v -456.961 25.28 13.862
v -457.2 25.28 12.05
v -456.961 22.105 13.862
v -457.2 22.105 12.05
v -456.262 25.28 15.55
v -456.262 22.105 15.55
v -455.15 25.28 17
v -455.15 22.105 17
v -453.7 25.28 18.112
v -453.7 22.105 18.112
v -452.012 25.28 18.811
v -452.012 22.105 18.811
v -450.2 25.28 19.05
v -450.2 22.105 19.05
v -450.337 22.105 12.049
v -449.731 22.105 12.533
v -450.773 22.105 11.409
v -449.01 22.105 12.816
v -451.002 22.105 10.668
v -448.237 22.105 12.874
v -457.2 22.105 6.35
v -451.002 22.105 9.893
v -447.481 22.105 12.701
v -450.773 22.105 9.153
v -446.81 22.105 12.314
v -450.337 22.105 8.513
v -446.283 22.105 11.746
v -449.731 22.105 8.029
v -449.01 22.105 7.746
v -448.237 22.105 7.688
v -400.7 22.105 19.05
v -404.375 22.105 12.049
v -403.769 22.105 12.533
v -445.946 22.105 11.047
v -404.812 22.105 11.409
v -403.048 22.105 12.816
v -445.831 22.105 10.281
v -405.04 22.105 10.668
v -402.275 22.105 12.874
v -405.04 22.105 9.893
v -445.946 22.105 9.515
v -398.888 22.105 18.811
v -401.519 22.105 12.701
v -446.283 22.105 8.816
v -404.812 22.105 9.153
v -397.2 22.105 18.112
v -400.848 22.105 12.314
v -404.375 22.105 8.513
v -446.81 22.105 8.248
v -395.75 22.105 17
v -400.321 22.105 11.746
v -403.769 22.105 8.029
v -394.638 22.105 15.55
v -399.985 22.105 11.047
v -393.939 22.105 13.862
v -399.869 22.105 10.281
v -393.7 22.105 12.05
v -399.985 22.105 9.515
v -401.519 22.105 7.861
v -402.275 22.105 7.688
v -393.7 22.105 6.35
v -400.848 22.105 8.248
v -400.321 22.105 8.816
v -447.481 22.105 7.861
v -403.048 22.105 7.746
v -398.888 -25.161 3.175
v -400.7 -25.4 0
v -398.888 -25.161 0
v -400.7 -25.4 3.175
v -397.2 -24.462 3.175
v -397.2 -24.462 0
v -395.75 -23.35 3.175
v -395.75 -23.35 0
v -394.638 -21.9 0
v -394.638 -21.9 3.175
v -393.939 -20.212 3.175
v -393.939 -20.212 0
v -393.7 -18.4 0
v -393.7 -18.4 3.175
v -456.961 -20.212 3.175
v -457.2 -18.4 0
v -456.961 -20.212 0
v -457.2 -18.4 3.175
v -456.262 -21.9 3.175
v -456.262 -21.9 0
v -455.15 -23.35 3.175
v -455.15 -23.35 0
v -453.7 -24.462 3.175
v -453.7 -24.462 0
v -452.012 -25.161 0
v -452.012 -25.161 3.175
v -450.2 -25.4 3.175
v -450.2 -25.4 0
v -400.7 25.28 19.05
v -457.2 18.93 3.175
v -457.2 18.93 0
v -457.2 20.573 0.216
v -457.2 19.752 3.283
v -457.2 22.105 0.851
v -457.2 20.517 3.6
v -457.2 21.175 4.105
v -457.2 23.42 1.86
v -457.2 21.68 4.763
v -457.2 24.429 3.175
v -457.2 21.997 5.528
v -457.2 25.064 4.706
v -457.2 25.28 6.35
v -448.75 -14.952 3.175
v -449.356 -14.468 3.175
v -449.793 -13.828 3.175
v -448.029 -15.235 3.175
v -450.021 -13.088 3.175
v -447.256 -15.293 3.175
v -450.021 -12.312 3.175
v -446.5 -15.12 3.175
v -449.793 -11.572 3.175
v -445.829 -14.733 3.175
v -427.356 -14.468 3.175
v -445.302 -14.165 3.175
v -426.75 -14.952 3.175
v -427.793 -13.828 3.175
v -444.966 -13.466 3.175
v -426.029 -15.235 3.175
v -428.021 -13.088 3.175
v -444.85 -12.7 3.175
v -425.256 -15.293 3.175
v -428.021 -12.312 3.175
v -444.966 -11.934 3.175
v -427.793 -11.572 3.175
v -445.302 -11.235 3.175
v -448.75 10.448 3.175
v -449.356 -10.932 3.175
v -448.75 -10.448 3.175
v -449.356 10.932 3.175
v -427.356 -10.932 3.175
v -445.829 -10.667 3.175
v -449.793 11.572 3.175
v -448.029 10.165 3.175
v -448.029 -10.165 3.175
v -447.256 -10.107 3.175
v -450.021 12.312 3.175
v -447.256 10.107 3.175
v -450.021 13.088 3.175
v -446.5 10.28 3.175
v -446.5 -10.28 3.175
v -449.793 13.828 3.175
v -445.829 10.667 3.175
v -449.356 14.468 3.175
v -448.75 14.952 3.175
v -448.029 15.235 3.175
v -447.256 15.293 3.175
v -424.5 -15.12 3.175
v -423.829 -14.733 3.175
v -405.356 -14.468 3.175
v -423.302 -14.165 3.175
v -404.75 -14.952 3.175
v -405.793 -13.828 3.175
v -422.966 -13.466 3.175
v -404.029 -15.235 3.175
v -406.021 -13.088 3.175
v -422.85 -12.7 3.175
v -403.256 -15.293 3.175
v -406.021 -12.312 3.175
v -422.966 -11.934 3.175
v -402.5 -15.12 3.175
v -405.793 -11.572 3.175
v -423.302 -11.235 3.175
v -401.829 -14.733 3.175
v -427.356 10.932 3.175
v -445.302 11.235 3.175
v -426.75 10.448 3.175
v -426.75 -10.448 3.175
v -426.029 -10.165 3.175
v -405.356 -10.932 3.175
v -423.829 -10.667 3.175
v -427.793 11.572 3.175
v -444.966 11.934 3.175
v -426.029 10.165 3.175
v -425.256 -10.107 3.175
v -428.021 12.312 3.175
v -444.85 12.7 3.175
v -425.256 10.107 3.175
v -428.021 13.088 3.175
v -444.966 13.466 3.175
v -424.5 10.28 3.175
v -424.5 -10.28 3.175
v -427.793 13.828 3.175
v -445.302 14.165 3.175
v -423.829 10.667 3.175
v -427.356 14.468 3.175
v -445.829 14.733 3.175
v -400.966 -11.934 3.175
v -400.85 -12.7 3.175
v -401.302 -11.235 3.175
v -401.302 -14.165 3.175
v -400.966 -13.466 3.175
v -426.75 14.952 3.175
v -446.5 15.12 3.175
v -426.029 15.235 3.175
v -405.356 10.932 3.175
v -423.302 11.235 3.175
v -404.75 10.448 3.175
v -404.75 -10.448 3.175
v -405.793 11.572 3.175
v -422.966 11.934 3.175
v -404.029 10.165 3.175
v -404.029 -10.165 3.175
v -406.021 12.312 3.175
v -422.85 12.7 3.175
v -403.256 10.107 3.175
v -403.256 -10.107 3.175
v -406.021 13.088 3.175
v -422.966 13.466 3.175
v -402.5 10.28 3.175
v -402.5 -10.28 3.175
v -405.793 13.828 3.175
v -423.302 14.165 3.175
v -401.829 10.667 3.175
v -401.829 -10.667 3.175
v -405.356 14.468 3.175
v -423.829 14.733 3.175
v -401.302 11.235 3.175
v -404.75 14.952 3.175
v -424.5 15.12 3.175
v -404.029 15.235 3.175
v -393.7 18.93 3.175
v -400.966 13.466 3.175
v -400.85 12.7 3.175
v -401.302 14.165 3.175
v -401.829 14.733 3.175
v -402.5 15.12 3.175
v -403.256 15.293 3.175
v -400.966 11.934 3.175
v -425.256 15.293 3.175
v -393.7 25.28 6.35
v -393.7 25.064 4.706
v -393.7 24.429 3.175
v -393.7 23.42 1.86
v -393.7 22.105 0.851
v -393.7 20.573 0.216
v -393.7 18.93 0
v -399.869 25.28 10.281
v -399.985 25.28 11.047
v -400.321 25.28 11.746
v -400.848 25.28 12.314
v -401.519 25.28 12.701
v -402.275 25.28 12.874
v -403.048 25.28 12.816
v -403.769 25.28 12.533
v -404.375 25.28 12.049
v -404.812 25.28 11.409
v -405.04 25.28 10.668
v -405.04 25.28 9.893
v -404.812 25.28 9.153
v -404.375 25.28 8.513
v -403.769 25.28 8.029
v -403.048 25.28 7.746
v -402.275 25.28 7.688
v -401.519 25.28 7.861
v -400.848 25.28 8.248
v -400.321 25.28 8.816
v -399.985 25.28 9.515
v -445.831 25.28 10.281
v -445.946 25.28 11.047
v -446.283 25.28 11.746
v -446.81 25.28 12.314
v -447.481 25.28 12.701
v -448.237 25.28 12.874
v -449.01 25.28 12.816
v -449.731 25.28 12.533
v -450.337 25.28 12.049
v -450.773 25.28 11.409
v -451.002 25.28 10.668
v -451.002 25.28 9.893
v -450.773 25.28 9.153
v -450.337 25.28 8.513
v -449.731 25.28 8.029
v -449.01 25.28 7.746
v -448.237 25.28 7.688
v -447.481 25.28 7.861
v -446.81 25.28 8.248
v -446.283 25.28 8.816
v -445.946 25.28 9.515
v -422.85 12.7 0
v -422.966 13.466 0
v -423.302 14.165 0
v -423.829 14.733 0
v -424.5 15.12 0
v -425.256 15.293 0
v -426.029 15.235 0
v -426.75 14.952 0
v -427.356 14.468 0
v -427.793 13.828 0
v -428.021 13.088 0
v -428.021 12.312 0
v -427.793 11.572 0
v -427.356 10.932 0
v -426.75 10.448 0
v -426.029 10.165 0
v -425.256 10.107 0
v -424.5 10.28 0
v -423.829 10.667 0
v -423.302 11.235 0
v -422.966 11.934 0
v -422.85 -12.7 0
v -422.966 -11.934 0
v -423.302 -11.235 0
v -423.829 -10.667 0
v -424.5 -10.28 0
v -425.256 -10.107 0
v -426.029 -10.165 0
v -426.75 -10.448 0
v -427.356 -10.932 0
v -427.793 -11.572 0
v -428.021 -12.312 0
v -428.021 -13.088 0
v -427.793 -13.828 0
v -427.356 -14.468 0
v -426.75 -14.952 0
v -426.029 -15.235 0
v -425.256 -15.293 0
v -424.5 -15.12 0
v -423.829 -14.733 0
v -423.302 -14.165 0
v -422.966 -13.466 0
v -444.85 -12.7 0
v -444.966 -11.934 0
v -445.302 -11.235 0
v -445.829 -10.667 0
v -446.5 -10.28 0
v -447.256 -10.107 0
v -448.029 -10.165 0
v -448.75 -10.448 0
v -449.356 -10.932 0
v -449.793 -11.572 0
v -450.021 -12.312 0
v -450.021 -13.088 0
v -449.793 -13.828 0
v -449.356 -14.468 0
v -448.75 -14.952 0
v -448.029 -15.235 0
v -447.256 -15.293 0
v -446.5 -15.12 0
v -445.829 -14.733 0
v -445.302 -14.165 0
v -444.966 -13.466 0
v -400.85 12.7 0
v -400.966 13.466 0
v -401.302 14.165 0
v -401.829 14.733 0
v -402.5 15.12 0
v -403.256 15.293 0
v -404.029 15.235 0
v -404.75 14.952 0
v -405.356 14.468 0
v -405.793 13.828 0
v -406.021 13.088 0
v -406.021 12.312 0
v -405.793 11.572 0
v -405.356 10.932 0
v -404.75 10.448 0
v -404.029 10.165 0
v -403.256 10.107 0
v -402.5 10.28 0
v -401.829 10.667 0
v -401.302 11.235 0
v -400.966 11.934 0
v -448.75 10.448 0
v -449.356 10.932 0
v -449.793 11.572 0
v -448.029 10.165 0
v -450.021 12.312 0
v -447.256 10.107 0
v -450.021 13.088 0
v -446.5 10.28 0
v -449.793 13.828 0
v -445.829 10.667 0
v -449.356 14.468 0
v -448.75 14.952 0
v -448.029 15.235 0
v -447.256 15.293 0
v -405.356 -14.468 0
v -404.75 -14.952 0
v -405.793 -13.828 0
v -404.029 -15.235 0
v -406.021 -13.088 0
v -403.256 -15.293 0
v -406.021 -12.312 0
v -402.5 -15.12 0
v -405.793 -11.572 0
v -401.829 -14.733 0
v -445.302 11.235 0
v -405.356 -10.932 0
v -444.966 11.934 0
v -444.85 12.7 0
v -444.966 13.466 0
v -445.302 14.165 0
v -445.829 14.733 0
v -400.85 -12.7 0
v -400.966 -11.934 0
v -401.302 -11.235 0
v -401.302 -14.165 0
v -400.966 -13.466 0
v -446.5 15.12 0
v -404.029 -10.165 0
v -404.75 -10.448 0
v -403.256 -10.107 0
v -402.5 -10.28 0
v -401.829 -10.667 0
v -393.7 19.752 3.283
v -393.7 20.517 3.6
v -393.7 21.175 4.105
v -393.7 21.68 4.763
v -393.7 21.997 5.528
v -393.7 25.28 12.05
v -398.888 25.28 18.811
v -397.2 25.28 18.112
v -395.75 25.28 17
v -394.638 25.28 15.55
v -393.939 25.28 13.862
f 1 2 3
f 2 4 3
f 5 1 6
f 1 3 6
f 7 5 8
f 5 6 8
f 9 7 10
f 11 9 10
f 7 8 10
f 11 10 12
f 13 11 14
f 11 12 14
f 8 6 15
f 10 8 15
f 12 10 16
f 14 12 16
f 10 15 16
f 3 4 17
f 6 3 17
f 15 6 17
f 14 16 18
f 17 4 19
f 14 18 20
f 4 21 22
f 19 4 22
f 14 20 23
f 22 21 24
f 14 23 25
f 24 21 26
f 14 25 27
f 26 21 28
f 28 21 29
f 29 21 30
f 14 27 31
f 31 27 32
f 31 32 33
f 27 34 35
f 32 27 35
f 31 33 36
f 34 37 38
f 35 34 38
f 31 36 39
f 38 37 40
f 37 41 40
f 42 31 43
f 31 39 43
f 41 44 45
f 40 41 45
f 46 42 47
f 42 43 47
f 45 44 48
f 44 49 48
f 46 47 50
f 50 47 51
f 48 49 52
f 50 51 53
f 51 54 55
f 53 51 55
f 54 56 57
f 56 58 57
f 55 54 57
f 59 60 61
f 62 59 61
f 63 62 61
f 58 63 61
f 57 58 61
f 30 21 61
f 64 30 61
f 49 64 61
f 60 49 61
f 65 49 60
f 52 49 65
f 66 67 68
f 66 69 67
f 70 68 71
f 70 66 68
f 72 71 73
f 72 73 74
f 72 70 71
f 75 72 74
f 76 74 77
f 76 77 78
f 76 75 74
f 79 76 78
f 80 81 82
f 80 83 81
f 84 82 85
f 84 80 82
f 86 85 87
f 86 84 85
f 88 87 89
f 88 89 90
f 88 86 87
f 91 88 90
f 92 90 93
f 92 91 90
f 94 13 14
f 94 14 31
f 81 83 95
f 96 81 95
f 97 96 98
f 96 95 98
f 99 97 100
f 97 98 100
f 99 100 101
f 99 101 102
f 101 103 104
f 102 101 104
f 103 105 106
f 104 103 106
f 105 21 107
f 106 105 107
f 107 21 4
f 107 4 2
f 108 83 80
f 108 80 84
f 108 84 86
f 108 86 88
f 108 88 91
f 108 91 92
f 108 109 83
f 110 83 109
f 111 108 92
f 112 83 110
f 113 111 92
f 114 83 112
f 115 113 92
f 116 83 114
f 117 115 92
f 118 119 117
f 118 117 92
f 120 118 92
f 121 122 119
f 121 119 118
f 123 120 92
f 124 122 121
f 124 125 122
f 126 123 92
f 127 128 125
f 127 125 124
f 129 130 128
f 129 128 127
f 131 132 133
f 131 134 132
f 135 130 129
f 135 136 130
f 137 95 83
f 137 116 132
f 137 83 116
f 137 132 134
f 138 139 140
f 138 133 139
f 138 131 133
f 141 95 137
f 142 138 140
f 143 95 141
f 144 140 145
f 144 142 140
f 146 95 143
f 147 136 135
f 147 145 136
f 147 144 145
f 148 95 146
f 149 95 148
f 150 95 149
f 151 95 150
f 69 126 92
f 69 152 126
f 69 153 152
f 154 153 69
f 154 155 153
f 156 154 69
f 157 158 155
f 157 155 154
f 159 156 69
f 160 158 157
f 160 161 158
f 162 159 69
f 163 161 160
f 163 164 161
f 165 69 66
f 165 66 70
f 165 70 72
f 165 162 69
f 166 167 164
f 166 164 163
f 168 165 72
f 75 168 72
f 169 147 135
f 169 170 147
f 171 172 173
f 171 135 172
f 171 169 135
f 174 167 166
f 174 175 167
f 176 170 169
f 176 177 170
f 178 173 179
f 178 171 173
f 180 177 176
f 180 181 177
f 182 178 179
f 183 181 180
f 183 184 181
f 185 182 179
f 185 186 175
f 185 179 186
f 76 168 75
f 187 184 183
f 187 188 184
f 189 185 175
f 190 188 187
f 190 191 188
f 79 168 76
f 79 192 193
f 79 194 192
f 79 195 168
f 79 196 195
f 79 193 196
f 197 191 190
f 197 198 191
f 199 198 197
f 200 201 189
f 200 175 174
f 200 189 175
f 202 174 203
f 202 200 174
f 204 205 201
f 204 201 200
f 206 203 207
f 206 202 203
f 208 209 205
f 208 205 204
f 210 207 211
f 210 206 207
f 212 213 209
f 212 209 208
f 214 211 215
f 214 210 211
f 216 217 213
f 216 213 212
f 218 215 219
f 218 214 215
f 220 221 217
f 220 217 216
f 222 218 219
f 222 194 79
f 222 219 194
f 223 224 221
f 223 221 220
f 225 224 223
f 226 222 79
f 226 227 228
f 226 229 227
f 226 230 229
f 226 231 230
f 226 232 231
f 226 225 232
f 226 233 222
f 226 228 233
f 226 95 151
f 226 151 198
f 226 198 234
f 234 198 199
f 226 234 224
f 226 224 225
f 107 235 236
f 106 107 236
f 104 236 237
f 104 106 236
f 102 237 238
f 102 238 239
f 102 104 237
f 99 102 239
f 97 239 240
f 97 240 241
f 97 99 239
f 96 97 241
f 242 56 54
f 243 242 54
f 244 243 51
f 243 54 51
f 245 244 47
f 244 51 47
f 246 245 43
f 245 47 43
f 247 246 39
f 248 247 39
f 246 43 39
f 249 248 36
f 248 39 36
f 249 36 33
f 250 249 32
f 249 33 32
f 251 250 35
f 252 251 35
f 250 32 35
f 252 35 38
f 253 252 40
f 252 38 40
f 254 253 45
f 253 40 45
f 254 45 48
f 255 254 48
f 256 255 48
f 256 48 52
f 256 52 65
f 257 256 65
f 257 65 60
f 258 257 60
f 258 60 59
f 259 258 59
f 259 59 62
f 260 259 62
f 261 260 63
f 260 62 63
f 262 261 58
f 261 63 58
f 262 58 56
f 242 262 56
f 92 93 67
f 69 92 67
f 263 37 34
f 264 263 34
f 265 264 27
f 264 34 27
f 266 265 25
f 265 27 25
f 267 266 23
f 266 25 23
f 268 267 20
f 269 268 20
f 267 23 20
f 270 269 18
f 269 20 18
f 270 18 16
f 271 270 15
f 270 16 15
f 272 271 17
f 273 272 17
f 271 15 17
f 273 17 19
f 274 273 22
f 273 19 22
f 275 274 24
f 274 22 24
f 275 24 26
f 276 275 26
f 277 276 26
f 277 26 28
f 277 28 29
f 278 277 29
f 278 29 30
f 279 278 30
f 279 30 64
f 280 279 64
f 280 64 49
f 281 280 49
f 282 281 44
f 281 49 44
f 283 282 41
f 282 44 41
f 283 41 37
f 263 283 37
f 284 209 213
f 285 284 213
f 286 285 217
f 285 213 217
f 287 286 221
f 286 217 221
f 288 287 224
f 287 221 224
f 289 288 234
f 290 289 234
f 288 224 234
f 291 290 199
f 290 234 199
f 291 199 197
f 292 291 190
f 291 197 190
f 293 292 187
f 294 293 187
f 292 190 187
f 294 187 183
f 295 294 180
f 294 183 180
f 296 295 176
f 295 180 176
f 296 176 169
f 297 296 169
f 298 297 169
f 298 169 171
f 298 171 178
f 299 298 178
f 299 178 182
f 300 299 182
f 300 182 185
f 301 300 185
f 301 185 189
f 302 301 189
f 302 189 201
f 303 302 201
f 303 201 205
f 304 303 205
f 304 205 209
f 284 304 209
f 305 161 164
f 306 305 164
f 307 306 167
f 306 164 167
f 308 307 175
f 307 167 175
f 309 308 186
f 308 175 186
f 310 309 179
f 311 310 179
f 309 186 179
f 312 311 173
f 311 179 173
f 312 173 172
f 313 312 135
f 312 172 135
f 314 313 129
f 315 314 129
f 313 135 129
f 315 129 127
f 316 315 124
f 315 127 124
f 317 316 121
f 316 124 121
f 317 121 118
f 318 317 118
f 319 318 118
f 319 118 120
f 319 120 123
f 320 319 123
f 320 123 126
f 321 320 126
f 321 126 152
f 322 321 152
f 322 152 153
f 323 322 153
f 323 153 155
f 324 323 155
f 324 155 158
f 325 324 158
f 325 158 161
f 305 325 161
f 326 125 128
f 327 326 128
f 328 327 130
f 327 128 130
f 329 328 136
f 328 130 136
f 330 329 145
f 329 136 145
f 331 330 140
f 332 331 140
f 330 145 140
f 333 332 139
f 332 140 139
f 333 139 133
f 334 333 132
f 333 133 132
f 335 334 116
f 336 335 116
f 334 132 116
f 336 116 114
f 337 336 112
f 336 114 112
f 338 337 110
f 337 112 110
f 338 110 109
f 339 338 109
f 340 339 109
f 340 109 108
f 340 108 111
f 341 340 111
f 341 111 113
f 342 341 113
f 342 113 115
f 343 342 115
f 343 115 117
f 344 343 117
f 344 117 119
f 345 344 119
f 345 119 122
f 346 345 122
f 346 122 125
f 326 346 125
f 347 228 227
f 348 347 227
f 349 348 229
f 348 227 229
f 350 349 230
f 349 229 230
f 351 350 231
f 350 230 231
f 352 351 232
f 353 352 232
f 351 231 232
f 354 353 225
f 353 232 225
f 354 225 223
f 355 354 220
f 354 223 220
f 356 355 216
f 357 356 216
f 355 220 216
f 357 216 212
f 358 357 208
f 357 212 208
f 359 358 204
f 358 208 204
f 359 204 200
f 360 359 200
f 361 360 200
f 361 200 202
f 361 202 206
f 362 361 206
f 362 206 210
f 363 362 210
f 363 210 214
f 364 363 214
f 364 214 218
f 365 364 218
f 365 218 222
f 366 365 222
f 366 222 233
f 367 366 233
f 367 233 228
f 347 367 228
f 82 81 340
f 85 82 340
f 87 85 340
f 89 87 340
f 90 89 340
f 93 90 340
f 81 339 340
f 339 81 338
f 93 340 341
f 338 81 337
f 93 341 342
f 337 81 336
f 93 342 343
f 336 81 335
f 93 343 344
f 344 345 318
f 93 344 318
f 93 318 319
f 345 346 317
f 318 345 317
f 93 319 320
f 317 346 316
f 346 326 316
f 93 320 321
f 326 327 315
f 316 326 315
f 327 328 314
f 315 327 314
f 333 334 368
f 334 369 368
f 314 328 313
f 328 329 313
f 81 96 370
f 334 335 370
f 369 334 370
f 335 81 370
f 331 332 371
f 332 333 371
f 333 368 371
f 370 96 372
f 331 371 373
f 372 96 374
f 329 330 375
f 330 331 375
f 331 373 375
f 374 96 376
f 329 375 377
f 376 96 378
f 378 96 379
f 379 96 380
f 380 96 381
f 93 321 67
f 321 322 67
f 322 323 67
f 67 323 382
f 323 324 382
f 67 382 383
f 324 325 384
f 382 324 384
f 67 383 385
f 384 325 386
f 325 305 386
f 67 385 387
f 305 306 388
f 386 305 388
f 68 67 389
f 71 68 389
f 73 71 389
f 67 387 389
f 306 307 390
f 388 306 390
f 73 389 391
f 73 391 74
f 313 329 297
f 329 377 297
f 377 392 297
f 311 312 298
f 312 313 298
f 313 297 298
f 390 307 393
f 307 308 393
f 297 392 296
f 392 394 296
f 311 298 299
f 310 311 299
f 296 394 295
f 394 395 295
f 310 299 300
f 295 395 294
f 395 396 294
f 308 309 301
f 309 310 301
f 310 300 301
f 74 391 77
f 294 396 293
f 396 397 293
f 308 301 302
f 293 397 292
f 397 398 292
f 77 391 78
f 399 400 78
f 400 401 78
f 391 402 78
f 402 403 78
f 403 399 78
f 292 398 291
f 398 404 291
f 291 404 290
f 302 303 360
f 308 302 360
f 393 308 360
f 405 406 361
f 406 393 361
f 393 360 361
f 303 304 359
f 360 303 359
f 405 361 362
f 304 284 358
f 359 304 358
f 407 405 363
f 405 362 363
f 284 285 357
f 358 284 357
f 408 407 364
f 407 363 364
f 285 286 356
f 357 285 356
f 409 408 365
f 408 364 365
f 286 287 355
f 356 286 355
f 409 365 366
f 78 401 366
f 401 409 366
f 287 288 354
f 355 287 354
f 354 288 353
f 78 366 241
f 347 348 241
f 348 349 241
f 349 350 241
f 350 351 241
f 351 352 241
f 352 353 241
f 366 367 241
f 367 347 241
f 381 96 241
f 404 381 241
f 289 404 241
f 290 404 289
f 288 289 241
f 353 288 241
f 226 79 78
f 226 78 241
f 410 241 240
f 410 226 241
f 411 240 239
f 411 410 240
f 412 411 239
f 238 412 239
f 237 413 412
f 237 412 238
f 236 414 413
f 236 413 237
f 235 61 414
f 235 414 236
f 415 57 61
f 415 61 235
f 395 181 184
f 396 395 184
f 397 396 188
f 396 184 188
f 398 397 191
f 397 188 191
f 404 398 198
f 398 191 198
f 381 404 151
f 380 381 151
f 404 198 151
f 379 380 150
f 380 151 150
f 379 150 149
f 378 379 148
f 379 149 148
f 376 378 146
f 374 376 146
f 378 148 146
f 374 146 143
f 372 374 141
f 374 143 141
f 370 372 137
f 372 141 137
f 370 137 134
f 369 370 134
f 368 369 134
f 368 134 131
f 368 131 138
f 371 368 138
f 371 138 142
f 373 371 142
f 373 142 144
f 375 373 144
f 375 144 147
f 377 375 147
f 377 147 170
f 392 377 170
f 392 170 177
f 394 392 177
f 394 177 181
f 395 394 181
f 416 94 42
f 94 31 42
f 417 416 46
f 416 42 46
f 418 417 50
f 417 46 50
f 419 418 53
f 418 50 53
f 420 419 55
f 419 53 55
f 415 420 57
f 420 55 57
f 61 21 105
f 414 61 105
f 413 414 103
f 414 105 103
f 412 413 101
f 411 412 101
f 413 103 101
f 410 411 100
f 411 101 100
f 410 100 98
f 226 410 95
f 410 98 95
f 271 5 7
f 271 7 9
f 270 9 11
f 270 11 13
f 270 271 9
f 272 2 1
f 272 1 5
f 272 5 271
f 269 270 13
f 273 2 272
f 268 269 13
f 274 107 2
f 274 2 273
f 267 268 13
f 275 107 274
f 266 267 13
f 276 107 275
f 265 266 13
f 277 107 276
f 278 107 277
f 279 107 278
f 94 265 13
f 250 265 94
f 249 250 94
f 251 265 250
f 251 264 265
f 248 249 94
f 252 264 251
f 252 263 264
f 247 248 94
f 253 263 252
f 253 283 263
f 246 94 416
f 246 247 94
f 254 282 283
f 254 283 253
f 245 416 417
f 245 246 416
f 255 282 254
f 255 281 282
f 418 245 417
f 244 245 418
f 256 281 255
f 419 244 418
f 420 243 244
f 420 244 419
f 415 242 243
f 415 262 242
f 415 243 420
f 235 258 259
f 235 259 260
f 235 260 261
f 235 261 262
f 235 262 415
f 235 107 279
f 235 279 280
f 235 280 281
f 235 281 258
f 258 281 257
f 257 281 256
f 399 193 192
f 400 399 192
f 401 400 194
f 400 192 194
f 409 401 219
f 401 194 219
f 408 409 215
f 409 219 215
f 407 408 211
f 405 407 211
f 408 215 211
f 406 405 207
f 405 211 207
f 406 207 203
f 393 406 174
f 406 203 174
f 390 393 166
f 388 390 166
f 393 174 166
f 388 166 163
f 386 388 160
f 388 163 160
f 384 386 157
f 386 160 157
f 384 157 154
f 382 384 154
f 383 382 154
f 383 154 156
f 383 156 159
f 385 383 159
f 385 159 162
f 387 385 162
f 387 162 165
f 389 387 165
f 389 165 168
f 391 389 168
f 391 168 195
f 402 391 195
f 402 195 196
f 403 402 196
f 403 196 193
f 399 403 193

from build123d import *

# Parameters (mm, degrees)
SKETCH2_W              = 63.5
SKETCH2_H              = 50.679996867
BOSS_EXTRUDE1_DEPTH    = 3.175
SKETCH3_W              = 63.5
SKETCH3_H              = 19.05
BOSS_EXTRUDE2_DEPTH    = 3.175
SKETCH4_R              = 2.6
CUT_EXTRUDE1_DEPTH     = 3.175
FILLET1_R              = 7
CONVERT_SOLID1_START   = -457.2
CONVERT_SOLID1_DEPTH   = 63.5
CONVERT_SOLID1_2_DEPTH = 63.5
SKETCH5_R              = 2.6
CUT_EXTRUDE2_DEPTH     = 10


# Read off the part's stored shape, not the designer's step: Convert-Solid1
with BuildPart() as part:
    # Sketch2 → Boss-Extrude1 (new body)
    with BuildSketch(Plane.XY):
        with Locations((-425.45, -0.060001567)):
            Rectangle(SKETCH2_W, SKETCH2_H)
    extrude(amount=BOSS_EXTRUDE1_DEPTH)

    # Sketch3 → Boss-Extrude2 (add)
    with BuildSketch(Plane(origin=(0, 25.279996867, 0), x_dir=(1, 0, 0), z_dir=(0, 1, 0))):
        with Locations((-425.45, -9.525)):
            Rectangle(SKETCH3_W, SKETCH3_H)
    extrude(amount=-BOSS_EXTRUDE2_DEPTH)

    # Sketch4 → Cut-Extrude1 (cut)
    with BuildSketch(Plane.XZ.offset(-22.104996867)):
        with Locations((-402.469029611, 10.280970389)):
            Circle(SKETCH4_R)
        with Locations((-448.430970389, 10.280970389)):
            Circle(SKETCH4_R)
    extrude(amount=-CUT_EXTRUDE1_DEPTH, mode=Mode.SUBTRACT)

    # Fillet1
    fillet1_edges = [part.edges().sort_by_distance(p)[0] for p in [
        (-457.2, 23.692496867, 19.05),
        (-393.7, 23.692496867, 19.05),
        (-393.7, -25.4, 1.5875),
        (-457.2, -25.4, 1.5875),
    ]]
    fillet(fillet1_edges, radius=FILLET1_R)

    # Convert-Solid1 outline → Convert-Solid1 (cut)
    with BuildSketch(Plane.YZ.offset(CONVERT_SOLID1_START)):
        with BuildLine():
            Line((25.279996867, 0), (25.279996867, 6.35))
            ThreePointArc((25.279996867, 6.35), (23.420124928, 1.859871939), (18.929996867, 0))
            Line((18.929996867, 0), (25.279996867, 0))
        make_face()
    extrude(amount=CONVERT_SOLID1_DEPTH, mode=Mode.SUBTRACT)

    # Convert-Solid1 2 outline → Convert-Solid1 2 (add)
    with BuildSketch(Plane.YZ.offset(CONVERT_SOLID1_START)):
        with BuildLine():
            Line((22.104996867, 3.175), (22.104996867, 6.35))
            ThreePointArc((22.104996867, 6.35), (21.175060897, 4.10493597), (18.929996867, 3.175))
            Line((18.929996867, 3.175), (22.104996867, 3.175))
        make_face()
    extrude(amount=CONVERT_SOLID1_2_DEPTH)

    # Sketch5 → Cut-Extrude2 (cut)
    with BuildSketch(Plane.XY.offset(3.175)):
        with Locations((-447.45, 12.7)):
            Circle(SKETCH5_R)
        with Locations((-425.45, 12.7)):
            Circle(SKETCH5_R)
        with Locations((-403.45, 12.7)):
            Circle(SKETCH5_R)
        with Locations((-403.45, -12.7)):
            Circle(SKETCH5_R)
        with Locations((-425.45, -12.7)):
            Circle(SKETCH5_R)
        with Locations((-447.45, -12.7)):
            Circle(SKETCH5_R)
    extrude(amount=-CUT_EXTRUDE2_DEPTH, mode=Mode.SUBTRACT)


solid = part.part
